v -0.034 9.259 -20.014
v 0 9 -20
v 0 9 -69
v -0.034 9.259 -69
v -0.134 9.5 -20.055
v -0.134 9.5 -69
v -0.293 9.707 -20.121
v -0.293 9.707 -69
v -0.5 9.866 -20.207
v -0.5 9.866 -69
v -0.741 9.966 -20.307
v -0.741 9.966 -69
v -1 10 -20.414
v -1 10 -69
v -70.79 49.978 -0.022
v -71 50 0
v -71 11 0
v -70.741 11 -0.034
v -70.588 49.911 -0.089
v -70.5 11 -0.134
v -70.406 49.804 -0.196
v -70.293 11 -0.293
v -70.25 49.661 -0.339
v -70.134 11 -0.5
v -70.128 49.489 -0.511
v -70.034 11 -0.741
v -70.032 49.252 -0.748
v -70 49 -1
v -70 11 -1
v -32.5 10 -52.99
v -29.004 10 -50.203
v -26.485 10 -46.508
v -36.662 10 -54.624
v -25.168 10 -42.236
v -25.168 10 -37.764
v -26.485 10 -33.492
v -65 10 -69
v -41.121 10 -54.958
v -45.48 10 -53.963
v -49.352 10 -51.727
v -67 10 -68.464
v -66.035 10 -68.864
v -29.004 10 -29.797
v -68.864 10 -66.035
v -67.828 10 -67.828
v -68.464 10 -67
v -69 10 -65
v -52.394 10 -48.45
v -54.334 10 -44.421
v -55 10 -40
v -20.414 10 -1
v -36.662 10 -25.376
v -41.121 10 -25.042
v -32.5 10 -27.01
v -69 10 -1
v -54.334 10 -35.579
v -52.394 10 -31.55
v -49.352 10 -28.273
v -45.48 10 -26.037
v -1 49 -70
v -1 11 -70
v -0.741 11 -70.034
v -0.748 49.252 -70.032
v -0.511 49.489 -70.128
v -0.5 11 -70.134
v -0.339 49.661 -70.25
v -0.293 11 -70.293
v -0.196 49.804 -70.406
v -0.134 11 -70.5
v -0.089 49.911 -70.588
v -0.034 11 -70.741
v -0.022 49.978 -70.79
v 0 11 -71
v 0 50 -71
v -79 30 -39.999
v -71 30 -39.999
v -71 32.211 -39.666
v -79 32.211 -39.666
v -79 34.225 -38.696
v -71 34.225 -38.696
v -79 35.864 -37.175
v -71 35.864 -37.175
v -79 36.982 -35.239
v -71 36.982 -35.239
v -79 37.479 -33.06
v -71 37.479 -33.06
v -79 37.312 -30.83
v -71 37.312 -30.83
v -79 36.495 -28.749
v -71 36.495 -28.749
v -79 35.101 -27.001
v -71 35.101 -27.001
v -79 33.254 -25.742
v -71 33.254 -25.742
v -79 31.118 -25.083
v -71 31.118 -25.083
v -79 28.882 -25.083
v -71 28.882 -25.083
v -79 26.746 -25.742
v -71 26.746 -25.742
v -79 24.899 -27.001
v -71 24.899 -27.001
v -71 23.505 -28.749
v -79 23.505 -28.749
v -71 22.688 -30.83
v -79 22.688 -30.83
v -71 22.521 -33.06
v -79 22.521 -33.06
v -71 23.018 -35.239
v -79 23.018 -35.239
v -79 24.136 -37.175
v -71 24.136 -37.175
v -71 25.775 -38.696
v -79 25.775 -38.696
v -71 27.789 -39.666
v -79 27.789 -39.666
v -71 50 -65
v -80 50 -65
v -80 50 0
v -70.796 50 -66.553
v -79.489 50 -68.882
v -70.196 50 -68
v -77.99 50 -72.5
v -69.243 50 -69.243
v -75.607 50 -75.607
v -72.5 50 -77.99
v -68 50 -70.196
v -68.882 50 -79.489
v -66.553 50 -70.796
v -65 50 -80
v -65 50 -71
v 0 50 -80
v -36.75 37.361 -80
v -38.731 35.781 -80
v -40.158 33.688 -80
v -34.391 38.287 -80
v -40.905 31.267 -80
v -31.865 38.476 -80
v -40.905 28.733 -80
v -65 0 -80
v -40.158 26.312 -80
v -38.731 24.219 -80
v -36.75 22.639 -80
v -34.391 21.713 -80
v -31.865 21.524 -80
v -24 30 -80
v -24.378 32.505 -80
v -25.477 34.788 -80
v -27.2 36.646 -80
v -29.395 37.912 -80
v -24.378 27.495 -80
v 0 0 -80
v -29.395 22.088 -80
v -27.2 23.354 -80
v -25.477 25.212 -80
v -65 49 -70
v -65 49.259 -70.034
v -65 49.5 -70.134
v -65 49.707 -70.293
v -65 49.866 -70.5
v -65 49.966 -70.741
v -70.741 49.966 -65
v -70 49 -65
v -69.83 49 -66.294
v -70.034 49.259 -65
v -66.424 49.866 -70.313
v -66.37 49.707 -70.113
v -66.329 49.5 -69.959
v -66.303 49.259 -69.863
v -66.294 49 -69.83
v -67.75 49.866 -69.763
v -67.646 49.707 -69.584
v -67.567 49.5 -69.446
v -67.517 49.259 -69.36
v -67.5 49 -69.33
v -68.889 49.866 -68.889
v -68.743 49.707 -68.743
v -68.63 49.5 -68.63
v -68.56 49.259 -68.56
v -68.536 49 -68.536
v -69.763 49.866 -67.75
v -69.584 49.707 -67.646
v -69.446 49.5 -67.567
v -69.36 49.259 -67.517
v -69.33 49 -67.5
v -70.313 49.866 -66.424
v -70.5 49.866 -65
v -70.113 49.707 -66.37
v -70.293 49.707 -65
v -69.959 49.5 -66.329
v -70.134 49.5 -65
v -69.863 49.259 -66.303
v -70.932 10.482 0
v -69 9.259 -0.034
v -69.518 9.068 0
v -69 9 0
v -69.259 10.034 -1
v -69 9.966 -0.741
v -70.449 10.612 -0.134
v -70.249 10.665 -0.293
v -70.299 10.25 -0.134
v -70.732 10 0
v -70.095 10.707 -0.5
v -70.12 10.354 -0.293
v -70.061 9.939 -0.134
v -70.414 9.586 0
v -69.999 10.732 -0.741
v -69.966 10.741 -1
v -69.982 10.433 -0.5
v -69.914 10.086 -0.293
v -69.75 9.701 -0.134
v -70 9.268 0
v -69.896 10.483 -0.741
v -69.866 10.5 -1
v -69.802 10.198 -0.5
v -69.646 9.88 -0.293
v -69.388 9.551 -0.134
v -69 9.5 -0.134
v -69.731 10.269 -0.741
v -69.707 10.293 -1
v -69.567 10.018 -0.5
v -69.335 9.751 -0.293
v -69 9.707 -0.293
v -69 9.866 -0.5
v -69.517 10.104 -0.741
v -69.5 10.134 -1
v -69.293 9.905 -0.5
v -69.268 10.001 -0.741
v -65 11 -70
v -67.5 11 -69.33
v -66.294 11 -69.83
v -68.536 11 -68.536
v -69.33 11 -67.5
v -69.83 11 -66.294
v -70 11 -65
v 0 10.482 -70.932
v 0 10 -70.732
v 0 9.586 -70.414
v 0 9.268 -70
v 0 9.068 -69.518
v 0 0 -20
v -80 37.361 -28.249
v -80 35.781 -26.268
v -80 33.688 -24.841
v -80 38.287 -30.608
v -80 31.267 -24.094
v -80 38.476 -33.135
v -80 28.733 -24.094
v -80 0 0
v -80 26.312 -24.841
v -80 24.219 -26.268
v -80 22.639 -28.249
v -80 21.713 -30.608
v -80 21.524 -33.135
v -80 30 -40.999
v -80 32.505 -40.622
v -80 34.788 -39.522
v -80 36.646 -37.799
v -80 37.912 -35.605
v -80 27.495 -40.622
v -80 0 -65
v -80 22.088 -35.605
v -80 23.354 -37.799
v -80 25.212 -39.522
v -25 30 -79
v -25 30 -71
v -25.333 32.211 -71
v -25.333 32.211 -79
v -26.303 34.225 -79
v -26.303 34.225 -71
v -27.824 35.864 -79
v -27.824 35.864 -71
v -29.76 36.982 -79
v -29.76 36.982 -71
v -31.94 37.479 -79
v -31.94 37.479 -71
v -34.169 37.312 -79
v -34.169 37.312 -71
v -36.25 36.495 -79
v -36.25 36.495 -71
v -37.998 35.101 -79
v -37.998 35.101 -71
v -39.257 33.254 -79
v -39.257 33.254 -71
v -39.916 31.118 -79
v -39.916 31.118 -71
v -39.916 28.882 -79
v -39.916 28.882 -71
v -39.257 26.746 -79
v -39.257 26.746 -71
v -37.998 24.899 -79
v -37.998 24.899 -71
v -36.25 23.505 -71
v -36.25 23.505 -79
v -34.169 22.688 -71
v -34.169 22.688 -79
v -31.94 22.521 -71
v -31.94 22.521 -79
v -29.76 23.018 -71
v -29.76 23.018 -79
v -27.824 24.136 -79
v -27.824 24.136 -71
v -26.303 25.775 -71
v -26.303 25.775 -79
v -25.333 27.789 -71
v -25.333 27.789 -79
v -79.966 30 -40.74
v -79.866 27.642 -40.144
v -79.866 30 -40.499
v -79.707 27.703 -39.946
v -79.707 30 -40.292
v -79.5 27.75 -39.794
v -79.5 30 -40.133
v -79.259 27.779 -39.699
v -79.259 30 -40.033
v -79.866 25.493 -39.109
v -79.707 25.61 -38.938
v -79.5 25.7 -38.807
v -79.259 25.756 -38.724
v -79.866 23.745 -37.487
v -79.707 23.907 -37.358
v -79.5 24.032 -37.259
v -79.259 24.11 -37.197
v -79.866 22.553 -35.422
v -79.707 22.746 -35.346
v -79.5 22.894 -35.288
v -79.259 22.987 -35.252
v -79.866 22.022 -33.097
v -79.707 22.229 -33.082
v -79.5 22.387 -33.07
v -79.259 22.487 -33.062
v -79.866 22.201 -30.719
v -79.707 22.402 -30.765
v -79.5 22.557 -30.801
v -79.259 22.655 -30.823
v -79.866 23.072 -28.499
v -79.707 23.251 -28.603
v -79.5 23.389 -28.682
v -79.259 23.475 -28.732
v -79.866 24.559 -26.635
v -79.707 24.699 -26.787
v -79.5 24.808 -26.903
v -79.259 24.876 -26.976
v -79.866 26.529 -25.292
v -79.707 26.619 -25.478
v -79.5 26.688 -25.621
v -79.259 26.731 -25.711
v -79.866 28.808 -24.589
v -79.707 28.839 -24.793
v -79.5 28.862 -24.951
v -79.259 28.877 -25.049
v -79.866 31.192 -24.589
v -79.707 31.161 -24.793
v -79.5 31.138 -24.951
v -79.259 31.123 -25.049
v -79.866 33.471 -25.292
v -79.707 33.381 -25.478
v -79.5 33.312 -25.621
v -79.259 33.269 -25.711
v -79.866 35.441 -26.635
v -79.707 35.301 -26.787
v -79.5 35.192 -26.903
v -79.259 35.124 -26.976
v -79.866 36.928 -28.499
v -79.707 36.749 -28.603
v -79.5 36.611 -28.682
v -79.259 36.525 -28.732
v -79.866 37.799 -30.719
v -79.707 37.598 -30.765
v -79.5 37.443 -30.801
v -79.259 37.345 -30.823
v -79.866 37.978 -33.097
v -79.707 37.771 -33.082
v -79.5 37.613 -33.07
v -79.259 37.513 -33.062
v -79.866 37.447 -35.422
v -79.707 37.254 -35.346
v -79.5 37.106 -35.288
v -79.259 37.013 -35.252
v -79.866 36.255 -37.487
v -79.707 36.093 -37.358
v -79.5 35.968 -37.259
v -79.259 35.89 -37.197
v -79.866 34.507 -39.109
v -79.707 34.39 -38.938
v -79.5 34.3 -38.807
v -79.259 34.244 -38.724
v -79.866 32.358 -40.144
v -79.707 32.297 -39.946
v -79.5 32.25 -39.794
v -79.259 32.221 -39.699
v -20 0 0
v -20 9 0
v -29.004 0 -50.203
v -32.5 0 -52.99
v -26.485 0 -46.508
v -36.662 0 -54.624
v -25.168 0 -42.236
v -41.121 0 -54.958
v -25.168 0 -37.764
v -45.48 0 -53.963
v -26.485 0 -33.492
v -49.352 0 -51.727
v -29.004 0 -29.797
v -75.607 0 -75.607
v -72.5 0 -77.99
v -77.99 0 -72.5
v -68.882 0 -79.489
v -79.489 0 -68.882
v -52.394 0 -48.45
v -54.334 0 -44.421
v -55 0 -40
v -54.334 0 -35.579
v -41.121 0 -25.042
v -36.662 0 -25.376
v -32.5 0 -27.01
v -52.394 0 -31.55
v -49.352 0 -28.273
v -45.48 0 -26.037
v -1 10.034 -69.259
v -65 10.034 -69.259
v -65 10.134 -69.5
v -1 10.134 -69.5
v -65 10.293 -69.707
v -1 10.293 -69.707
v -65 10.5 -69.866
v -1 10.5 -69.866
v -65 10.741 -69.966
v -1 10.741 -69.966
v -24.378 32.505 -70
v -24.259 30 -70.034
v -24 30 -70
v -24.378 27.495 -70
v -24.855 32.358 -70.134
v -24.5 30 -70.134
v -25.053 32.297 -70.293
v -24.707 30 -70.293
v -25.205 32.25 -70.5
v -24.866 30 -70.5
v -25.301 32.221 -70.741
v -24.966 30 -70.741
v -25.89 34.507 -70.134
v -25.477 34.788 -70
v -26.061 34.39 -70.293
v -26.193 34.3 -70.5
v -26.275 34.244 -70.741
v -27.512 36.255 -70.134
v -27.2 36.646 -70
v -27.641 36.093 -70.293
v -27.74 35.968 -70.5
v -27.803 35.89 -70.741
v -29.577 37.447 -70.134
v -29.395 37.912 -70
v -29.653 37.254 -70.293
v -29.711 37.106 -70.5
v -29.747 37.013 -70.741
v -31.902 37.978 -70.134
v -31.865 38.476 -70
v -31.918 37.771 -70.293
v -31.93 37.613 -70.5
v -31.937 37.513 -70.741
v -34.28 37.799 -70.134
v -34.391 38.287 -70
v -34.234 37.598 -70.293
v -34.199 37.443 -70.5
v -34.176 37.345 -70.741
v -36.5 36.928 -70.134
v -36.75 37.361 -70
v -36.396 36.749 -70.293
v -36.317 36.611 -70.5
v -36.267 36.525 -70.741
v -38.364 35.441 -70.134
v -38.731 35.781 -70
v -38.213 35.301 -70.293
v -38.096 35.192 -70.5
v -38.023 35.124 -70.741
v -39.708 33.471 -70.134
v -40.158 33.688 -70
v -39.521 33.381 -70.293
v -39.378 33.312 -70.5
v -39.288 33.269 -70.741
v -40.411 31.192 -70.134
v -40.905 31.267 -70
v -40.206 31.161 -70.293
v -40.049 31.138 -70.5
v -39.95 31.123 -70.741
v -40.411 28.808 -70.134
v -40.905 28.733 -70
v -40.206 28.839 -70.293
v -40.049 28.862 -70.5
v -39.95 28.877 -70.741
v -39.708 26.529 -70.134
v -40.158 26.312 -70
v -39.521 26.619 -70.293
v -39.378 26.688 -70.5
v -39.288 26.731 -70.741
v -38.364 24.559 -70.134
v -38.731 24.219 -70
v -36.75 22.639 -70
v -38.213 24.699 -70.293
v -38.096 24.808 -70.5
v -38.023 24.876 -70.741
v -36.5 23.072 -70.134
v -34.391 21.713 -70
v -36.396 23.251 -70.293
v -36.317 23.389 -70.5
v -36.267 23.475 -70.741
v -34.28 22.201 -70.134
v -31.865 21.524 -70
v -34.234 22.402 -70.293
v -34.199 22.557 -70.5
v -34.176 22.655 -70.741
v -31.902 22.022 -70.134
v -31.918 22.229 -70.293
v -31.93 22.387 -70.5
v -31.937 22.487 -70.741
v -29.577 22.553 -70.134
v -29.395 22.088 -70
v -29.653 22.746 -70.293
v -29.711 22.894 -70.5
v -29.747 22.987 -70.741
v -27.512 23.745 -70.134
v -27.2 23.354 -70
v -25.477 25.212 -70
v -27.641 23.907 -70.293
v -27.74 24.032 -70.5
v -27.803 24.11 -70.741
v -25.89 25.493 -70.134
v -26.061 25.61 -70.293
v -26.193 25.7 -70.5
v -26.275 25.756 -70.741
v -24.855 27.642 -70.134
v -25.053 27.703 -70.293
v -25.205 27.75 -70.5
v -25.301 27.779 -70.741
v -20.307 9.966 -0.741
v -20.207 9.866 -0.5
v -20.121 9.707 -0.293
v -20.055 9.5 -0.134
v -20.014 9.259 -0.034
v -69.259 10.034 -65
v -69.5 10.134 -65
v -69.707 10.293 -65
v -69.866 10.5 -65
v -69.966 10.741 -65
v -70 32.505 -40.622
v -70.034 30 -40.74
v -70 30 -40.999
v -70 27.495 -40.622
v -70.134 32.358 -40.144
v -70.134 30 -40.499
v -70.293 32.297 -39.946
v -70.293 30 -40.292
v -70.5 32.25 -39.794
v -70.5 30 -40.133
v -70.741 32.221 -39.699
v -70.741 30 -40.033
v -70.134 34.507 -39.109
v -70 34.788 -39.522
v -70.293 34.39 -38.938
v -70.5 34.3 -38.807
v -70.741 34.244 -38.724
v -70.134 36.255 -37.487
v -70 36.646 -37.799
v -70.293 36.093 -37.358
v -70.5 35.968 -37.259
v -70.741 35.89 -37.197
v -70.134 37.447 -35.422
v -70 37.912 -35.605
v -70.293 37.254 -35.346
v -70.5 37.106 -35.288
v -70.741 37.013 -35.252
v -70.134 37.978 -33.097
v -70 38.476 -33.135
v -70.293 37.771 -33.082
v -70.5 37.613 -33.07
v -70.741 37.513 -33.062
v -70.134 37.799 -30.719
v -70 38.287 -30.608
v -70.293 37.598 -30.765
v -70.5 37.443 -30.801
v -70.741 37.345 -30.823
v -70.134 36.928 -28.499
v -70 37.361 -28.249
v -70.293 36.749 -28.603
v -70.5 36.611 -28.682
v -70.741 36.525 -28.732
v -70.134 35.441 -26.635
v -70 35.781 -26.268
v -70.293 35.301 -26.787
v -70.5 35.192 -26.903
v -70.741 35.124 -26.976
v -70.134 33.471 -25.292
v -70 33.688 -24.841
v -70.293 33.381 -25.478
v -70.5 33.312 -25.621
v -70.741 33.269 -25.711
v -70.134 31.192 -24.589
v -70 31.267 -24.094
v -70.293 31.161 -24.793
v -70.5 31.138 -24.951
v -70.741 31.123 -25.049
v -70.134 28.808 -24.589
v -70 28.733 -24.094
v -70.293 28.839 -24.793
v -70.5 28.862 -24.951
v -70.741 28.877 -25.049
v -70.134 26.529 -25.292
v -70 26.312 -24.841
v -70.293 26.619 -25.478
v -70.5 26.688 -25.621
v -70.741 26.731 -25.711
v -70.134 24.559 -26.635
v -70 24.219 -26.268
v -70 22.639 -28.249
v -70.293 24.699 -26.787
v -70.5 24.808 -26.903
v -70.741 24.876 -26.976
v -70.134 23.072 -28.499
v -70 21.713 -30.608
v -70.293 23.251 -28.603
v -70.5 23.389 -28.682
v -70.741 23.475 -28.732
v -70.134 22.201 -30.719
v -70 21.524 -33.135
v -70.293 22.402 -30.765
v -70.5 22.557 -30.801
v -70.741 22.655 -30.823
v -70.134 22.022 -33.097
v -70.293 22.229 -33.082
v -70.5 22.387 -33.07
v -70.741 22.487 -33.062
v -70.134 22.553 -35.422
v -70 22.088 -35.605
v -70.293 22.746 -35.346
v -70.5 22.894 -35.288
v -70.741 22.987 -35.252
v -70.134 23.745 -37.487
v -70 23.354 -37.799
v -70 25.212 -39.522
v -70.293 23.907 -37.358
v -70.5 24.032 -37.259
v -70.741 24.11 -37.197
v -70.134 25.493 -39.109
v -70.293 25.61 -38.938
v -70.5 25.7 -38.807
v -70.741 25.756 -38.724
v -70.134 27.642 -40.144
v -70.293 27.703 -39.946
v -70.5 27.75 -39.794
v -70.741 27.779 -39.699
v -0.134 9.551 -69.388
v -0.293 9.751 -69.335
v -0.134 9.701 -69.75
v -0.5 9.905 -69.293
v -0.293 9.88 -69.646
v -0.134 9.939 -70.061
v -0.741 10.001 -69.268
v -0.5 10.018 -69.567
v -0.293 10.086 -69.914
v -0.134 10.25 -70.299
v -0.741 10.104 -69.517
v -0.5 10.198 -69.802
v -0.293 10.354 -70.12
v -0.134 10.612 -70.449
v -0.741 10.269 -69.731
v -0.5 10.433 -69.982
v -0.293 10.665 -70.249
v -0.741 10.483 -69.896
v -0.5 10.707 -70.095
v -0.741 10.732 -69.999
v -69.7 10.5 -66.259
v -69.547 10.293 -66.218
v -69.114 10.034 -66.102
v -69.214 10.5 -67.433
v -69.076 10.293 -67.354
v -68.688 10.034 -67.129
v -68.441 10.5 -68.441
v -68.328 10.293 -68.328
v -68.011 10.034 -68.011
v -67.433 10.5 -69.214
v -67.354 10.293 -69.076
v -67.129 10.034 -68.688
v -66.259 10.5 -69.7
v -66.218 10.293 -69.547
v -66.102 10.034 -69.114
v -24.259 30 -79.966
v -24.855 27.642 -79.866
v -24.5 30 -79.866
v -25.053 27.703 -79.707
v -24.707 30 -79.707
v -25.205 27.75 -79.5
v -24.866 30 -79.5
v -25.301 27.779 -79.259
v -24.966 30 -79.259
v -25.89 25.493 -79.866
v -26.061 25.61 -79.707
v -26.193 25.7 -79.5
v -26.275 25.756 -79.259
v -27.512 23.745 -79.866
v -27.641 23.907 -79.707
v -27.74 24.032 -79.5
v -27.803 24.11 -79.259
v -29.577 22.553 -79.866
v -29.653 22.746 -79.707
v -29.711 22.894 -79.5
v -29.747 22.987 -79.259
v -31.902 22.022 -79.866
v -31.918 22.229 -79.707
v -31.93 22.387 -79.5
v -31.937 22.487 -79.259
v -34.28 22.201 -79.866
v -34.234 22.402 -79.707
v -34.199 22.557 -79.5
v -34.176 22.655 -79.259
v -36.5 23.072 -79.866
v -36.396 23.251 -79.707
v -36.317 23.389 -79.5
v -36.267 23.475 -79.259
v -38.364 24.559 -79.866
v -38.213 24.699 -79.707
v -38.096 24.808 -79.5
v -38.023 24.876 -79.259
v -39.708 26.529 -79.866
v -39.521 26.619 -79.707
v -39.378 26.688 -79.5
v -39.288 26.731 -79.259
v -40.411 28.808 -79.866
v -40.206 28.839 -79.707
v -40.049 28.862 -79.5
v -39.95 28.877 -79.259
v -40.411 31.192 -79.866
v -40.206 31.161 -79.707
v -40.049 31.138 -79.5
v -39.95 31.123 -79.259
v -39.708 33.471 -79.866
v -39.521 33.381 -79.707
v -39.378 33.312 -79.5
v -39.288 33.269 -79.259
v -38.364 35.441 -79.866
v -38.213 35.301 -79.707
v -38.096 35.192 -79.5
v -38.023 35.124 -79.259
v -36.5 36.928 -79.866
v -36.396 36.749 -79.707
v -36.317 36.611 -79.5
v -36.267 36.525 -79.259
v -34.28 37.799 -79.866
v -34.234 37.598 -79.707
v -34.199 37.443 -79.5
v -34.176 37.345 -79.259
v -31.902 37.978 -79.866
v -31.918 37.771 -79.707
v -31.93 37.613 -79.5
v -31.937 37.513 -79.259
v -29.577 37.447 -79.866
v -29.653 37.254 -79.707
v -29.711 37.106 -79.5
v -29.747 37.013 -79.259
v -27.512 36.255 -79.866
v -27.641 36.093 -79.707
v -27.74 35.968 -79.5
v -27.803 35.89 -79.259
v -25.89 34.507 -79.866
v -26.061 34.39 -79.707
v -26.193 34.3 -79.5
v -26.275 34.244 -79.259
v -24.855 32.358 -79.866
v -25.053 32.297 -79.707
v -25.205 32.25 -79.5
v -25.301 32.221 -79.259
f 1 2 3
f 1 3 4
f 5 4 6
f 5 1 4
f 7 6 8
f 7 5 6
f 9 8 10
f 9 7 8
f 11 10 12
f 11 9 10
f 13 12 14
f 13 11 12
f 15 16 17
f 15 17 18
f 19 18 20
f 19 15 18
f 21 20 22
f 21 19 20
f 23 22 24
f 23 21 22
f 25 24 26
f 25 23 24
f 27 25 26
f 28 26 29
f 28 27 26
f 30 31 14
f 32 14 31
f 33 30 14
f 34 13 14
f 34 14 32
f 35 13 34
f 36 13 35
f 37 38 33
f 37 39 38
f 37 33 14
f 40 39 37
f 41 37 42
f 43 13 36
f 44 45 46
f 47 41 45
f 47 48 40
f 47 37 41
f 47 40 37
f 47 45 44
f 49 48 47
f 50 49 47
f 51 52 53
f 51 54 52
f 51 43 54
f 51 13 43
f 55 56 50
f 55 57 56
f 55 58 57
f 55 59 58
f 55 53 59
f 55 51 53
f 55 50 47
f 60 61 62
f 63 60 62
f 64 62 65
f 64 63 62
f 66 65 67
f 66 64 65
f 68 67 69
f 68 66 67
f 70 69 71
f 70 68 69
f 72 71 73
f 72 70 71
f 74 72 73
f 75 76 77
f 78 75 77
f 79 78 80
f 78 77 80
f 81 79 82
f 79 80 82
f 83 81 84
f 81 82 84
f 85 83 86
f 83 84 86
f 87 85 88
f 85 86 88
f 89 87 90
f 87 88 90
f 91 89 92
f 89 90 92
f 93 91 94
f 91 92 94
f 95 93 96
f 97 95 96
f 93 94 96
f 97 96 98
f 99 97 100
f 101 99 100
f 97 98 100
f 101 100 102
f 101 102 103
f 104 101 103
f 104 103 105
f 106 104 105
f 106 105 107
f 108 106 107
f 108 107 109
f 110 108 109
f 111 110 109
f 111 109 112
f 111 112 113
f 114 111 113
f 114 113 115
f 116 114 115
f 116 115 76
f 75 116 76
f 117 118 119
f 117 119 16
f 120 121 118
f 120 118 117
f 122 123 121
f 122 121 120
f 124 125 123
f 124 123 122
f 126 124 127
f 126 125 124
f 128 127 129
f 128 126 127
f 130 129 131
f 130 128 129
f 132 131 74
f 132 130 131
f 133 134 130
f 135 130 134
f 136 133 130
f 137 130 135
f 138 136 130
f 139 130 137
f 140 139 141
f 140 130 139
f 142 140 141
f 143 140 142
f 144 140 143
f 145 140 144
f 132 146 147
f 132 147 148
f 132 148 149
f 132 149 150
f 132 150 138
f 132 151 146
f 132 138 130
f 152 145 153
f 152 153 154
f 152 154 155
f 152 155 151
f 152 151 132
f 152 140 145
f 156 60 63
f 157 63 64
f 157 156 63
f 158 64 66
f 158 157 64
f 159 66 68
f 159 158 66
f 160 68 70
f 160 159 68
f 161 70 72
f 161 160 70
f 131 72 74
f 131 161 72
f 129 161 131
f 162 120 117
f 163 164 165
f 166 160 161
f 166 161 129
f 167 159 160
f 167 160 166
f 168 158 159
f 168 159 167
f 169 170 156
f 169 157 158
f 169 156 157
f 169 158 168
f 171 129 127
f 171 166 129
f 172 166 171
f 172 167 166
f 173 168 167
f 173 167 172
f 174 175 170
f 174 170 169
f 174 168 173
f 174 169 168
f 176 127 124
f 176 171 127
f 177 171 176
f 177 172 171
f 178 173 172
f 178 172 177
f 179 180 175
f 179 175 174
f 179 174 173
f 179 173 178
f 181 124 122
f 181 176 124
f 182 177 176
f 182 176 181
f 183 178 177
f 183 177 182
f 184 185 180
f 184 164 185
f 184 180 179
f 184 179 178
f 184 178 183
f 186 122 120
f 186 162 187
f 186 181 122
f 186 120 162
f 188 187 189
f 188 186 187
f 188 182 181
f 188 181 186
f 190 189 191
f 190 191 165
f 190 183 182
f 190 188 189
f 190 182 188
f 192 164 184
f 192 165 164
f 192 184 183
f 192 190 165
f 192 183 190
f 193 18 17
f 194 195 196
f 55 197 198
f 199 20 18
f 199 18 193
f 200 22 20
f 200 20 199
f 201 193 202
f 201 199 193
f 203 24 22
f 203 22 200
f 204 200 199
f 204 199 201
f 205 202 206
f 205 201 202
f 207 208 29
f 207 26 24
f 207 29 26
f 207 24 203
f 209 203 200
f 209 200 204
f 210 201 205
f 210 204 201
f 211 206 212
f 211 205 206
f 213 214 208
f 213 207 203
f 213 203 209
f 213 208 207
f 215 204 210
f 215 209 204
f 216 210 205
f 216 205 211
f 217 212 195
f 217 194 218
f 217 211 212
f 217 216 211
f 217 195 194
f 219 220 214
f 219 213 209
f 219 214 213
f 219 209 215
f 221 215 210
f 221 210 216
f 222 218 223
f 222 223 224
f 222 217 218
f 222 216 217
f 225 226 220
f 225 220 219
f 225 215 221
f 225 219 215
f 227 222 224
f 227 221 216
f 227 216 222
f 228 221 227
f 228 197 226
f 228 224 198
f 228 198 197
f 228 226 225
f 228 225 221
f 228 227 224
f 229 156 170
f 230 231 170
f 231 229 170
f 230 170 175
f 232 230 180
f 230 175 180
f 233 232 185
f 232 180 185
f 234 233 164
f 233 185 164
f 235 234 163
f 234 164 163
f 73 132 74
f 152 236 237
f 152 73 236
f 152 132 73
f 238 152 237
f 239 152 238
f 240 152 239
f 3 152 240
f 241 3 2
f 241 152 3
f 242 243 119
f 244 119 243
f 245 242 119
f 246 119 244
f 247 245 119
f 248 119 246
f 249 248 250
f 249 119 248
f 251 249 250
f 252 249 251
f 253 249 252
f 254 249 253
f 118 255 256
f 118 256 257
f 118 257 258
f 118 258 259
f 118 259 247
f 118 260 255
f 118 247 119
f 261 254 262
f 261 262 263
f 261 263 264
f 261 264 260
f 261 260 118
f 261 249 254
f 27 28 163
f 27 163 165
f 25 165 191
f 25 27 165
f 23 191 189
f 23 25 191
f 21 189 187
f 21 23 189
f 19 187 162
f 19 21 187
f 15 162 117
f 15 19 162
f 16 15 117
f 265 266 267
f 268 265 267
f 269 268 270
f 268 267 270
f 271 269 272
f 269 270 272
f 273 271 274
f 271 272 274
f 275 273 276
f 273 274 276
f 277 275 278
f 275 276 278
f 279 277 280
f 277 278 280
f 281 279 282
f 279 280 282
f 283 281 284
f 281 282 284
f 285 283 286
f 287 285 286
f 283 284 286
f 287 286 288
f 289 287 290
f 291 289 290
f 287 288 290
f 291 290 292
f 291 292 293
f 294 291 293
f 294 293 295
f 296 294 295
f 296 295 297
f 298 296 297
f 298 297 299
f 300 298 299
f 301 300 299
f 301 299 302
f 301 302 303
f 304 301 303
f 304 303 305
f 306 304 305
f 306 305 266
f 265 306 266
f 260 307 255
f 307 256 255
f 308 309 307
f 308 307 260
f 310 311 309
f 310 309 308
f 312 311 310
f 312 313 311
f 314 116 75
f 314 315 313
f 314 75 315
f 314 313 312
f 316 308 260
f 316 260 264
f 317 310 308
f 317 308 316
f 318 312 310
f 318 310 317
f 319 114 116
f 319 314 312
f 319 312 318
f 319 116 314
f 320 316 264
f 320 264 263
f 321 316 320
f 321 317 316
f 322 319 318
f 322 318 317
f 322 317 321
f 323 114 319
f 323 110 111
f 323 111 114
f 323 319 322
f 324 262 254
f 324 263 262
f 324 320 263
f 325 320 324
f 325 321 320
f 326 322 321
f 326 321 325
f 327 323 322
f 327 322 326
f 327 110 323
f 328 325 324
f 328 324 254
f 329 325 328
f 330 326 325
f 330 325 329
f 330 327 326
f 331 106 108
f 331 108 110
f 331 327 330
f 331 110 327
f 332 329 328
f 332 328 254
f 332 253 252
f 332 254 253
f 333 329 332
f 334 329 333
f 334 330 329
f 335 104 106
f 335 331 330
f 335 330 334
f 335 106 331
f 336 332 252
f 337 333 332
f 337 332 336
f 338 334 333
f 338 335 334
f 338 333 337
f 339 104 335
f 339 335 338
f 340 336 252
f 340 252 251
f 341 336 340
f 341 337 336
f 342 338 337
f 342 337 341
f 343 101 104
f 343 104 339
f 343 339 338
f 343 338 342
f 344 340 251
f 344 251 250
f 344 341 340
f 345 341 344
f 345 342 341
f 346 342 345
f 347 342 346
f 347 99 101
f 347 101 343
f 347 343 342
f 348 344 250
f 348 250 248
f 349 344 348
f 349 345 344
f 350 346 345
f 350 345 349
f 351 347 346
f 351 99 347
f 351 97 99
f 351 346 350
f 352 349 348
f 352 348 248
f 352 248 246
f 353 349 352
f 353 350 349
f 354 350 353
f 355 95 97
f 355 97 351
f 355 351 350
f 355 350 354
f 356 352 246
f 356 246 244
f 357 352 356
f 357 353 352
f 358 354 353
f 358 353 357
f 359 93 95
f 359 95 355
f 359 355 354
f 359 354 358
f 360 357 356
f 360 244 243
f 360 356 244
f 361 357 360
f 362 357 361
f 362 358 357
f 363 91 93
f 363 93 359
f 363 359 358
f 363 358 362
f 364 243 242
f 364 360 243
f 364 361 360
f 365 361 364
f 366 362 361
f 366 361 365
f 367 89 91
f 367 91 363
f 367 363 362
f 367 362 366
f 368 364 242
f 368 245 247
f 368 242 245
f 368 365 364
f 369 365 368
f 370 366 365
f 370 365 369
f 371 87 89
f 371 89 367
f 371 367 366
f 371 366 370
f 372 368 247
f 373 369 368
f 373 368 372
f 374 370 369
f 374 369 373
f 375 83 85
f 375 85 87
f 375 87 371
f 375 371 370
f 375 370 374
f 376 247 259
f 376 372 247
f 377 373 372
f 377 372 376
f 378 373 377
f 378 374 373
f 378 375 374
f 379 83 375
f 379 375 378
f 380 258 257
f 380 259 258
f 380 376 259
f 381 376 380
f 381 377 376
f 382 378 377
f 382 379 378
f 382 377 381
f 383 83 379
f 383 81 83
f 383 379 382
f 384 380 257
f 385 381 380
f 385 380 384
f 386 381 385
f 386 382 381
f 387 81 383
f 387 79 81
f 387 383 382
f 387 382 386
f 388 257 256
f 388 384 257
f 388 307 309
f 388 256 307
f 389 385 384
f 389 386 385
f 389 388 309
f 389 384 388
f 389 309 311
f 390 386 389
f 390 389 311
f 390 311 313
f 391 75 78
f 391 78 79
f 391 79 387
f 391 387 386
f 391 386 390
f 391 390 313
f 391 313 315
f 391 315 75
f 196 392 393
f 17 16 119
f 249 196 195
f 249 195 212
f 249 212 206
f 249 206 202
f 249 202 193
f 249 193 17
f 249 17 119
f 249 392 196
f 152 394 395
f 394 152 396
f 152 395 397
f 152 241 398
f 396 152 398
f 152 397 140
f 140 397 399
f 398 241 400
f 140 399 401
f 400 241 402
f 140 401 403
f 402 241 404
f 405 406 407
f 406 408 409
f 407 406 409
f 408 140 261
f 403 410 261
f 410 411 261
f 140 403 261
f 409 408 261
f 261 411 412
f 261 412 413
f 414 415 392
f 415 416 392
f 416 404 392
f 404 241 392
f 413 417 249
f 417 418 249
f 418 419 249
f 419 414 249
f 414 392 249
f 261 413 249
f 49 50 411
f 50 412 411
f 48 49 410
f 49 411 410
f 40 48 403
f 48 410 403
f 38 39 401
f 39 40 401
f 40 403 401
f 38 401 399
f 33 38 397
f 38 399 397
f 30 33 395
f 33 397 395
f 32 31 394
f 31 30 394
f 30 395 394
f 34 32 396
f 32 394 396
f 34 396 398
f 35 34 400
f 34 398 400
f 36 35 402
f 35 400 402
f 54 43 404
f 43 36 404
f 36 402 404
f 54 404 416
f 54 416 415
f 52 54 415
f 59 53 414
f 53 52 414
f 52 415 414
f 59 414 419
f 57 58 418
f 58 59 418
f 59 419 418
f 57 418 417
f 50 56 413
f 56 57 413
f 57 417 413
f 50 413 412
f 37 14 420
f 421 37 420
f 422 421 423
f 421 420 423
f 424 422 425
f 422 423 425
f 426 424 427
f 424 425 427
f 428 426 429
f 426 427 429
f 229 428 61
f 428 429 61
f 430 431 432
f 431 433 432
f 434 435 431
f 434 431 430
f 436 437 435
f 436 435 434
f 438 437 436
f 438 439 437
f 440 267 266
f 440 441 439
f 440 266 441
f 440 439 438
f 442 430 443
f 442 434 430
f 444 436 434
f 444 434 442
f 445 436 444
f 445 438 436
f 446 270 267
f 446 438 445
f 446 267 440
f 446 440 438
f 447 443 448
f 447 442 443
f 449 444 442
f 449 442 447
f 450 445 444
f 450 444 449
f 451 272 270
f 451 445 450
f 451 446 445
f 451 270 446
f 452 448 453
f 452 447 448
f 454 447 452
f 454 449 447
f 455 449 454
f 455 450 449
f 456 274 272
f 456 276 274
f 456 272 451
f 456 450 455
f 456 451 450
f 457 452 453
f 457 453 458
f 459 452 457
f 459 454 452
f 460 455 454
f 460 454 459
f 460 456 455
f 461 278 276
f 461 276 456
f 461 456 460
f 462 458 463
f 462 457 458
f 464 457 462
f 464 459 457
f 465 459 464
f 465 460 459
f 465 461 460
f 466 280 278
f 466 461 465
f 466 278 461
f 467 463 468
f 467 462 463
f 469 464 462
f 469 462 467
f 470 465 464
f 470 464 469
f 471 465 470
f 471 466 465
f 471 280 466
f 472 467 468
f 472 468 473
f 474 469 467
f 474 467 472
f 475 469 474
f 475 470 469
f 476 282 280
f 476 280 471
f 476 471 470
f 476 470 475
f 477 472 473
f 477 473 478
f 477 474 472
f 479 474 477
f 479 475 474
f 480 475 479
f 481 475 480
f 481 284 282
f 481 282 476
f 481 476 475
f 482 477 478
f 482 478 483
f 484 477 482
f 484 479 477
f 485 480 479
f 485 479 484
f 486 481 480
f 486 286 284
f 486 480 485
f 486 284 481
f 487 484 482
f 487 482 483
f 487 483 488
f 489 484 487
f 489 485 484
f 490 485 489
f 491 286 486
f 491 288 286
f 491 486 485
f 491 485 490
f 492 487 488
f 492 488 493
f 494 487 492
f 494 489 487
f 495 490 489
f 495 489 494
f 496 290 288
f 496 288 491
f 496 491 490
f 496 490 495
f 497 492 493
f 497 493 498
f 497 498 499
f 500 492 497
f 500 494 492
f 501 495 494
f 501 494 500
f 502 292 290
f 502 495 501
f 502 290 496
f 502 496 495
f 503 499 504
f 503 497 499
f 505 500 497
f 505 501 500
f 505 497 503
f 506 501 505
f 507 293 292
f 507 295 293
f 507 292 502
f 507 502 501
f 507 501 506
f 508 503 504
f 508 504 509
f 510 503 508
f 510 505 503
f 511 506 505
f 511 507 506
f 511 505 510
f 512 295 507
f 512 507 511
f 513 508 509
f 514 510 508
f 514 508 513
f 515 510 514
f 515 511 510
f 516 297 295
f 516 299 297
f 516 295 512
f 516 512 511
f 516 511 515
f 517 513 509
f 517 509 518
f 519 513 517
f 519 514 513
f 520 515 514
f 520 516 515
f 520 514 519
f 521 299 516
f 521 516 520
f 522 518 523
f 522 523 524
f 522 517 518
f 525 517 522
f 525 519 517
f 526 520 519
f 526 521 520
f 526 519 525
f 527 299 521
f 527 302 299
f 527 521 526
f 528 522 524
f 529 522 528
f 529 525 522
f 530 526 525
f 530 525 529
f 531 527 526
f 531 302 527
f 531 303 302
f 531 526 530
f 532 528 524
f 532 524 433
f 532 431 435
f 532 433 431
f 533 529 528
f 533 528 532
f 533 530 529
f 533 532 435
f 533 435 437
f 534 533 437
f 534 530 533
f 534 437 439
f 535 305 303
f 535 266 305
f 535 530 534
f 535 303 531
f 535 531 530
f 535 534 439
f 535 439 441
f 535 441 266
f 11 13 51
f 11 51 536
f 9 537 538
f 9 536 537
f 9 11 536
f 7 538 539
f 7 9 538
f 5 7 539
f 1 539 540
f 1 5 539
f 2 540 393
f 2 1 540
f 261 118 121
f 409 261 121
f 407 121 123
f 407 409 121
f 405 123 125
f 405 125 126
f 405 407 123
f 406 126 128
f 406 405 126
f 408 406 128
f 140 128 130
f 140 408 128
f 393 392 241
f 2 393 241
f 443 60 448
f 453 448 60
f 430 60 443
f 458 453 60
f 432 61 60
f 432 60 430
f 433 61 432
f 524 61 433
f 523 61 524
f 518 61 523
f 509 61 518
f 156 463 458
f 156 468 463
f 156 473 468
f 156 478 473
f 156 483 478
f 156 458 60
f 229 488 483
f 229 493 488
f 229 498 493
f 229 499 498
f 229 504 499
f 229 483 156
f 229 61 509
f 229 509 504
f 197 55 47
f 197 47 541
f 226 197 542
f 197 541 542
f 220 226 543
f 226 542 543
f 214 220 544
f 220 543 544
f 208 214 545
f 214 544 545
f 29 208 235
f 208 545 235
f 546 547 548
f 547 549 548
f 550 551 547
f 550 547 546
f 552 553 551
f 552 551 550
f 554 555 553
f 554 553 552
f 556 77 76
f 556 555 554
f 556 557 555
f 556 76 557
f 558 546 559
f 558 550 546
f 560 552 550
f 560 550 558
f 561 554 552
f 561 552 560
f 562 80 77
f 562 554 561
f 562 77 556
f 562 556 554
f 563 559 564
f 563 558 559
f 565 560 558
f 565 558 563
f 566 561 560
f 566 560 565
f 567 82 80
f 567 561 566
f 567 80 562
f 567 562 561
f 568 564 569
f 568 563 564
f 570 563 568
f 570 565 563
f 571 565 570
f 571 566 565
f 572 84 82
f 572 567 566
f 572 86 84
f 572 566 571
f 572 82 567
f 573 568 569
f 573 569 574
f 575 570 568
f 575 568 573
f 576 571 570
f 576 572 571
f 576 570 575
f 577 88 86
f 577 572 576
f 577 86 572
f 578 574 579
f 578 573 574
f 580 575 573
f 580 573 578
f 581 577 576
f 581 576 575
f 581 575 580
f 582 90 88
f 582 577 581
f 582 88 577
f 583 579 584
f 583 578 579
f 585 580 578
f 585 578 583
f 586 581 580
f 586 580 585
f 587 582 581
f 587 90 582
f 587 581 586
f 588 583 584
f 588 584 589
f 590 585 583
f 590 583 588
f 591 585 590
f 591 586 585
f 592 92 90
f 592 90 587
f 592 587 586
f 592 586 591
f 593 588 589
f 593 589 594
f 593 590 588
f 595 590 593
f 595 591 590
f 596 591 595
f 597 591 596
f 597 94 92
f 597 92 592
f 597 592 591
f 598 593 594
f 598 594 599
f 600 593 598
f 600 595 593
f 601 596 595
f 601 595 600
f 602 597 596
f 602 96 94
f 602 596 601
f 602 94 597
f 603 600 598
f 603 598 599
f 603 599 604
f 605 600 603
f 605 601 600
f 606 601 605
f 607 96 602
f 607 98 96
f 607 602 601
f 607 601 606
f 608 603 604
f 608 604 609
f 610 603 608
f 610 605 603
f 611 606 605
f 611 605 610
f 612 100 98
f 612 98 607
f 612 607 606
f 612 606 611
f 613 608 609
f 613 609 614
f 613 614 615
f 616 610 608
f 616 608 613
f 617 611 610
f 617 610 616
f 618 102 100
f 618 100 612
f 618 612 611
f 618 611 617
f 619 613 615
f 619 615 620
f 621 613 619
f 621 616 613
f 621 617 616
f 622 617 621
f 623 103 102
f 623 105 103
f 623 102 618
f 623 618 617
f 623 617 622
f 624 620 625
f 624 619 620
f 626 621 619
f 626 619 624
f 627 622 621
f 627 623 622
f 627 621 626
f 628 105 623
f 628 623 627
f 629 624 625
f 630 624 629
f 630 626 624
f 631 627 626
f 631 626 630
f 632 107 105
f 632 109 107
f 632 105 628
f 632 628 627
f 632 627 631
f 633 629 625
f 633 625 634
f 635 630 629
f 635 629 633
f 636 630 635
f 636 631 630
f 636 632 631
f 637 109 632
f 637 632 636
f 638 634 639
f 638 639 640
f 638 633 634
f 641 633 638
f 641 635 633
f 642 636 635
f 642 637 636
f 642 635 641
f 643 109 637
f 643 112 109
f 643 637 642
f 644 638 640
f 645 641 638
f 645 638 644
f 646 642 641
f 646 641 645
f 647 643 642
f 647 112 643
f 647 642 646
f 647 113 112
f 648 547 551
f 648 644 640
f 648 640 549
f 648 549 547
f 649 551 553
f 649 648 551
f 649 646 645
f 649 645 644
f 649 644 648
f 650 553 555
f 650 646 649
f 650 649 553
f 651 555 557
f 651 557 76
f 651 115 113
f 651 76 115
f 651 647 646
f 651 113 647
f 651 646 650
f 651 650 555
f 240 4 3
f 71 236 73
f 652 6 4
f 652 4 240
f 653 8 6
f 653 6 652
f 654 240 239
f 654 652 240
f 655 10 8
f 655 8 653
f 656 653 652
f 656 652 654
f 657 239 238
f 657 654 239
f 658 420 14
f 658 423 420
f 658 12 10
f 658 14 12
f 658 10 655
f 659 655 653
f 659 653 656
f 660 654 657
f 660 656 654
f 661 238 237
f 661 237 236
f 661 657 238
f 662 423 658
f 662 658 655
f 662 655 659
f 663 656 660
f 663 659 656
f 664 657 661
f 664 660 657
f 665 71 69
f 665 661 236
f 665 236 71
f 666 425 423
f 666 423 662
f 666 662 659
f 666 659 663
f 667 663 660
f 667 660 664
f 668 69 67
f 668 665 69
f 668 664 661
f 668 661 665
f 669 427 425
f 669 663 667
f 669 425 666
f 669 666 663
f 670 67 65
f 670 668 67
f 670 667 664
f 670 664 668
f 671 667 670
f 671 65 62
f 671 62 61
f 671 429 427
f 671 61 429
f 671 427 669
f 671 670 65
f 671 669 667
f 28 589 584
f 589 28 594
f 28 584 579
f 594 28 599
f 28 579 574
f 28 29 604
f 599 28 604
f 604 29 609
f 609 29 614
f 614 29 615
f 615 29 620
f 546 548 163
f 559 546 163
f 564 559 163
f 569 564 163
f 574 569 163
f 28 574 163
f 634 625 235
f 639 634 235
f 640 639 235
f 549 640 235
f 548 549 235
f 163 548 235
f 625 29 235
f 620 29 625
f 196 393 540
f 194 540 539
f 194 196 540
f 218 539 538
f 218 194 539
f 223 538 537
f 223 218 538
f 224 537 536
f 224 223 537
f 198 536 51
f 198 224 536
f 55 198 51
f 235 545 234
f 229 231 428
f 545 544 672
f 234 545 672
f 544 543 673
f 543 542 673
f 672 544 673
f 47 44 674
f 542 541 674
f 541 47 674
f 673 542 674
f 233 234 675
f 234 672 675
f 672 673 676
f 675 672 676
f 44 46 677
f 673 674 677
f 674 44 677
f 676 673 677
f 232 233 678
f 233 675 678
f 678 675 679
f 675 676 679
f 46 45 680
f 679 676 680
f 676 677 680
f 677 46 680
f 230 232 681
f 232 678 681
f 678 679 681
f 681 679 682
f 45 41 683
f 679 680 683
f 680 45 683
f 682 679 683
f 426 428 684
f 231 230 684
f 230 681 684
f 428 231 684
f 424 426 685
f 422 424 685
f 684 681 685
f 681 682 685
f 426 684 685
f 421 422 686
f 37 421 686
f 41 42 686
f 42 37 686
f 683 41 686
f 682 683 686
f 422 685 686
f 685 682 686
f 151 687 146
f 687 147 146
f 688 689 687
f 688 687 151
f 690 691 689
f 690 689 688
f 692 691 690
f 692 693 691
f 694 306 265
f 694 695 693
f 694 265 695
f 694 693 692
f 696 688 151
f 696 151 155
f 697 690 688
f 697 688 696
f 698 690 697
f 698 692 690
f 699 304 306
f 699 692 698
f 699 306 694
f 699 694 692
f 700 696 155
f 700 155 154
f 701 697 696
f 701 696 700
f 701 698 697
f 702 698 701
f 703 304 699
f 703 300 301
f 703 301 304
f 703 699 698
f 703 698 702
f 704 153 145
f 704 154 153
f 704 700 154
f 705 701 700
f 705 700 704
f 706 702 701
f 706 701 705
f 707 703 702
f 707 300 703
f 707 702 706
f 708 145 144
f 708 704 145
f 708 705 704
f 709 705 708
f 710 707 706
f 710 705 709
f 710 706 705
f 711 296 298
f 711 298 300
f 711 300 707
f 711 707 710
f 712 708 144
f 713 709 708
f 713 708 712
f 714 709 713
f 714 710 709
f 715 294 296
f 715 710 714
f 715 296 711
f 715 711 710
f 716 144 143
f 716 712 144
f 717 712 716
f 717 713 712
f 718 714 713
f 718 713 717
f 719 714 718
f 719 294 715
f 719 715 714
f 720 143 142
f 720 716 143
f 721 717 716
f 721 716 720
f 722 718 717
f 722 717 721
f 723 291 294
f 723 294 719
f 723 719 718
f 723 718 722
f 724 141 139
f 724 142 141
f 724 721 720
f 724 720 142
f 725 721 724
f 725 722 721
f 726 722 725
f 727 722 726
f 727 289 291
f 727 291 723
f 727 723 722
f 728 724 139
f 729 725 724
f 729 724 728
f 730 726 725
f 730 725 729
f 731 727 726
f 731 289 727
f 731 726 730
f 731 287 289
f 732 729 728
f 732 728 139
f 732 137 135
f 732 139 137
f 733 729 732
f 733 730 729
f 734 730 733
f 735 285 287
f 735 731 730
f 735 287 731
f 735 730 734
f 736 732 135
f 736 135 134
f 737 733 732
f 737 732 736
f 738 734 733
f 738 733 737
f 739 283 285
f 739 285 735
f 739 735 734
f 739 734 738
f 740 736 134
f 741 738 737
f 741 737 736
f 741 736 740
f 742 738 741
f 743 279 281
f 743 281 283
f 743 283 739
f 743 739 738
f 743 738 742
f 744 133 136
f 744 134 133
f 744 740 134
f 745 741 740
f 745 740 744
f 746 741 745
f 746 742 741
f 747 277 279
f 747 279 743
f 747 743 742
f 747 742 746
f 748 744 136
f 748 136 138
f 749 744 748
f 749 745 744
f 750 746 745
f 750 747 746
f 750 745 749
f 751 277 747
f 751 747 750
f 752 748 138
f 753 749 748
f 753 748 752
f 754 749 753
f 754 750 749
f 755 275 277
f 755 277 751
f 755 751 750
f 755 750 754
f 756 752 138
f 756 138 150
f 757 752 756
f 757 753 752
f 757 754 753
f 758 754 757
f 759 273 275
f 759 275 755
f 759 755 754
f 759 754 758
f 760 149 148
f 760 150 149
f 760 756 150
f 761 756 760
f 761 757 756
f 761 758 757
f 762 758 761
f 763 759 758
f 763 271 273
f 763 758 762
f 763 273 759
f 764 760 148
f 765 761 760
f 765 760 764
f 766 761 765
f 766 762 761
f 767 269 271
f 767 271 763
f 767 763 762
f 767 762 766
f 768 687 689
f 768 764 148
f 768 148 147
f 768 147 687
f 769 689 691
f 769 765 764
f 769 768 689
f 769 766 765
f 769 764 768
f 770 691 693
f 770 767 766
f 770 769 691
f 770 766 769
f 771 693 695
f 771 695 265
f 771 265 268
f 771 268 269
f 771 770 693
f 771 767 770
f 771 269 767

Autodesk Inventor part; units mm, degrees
ref_plane "YZ Plane" through (0, 0, 0) normal (1, 0, 0) x (0, 1, 0)
ref_plane "XZ Plane" through (0, 0, 0) normal (0, 1, 0) x (-1, 0, 0)
ref_plane "XY Plane" through (0, 0, 0) normal (0, 0, 1) x (1, 0, 0)
sketch "Sketch1" plane through (0, 0, 0) normal (0, 1, 0) x (-1, 0, 0)
  line L0 (0, 0) -> (80, 0)
  line L1 (80, 0) -> (80, -80)
  line L2 (80, -80) -> (0, -80)
  line L3 (0, -80) -> (0, 0)
  circle A0 centre (40, -40) radius 15
  line L4 (20, 0) -> (0, -20)
  point P0 (80, -40)
  point P1 (40, -80)
  dimension "d0" = 80
  dimension "d1" = 80
  dimension "d3" = 30
  dimension "d4" = 20
  dimension "d5" = 20
extrude "Extrusion1" add sketch "Sketch1" along normal blind 10 contours L0 L1 L2 L3 L4
sketch "Sketch2" plane through (0, 10, 0) normal (0, 1, 0) x (1, 0, 0)
  line L0 (0, 80) -> (-80, 80) projected
  line L1 (0, 20) -> (0, 80) projected
  line L2 (-80, 80) -> (0, 80)
  line L3 (0, 80) -> (0, 70)
  line L4 (0, 70) -> (-80, 70)
  line L5 (-80, 70) -> (-80, 80)
  line L6 (-80, 80) -> (-80, 0) projected
  line L7 (-80, 0) -> (-70, 0)
  line L8 (-70, 0) -> (-70, 80)
  line L9 (-70, 80) -> (-80, 80)
  line L10 (-80, 80) -> (-80, 0)
  point P0 (0, 0)
  point P1 (-70, 70)
  dimension "d8" = 10
  dimension "d9" = 10
extrude "Extrusion2" add sketch "Sketch2" along normal blind 40
fillet "Fillet1" radius 5 1 edges at (-70, 30, -70)
fillet "Fillet2" radius 15 1 edges at (-80, 25, -80)
sketch "Sketch3" plane through (0, 10, -70) normal (0, 0, 1) x (1, 0, 0)
  circle A0 centre (-32.5, 20) radius 7.5
  line L0 (0, 0) -> (0, 40) projected
  line L1 (-65, 40) -> (0, 40) projected
  line L2 (-80, -10) -> (-80, 40) projected
  point P0 (0, -10)
  point P1 (0, 20)
  point P2 (-32.5, 40)
  point P3 (-32.5, 40)
  point P4 (0, 20)
  point P5 (0, 20)
  point P6 (0, 20)
  dimension "d14" = 15
  dimension "d15" = 80
extrude "Extrusion3" cut sketch "Sketch3" against normal blind 40
sketch "Sketch4" plane through (-70, 10, 0) normal (1, 0, 0) x (0, 0, -1)
  circle A0 centre (32.4993, 20) radius 7.5
  line L0 (65, 40) -> (65, 0) projected
  line L1 (0, 0) -> (0, 40) projected
  point P0 (0, -10)
  point P1 (0, 20)
  dimension "d18" = 15
  dimension "d19" = 65
  dimension "d20" = 32.4993
extrude "Extrusion4" cut sketch "Sketch4" against normal blind 40
fillet "Fillet3" radius 1 14 edges at (-32.5, 50, -70) (-70, 50, -32.5) (-70, 30, 0) (-68.5355, 10, -68.5355) (-32.5, 10, -70) (-70, 10, -32.5) (-45, 10, 0) (-10, 10, -10) (0, 10, -45) (0, 30, -70) (-70, 30, -24.9993) (-40, 30, -70) (-40, 30, -80) (-80, 30, -24.9993)
properties part number "Tutorial Pt.1" material "Stainless Steel"
